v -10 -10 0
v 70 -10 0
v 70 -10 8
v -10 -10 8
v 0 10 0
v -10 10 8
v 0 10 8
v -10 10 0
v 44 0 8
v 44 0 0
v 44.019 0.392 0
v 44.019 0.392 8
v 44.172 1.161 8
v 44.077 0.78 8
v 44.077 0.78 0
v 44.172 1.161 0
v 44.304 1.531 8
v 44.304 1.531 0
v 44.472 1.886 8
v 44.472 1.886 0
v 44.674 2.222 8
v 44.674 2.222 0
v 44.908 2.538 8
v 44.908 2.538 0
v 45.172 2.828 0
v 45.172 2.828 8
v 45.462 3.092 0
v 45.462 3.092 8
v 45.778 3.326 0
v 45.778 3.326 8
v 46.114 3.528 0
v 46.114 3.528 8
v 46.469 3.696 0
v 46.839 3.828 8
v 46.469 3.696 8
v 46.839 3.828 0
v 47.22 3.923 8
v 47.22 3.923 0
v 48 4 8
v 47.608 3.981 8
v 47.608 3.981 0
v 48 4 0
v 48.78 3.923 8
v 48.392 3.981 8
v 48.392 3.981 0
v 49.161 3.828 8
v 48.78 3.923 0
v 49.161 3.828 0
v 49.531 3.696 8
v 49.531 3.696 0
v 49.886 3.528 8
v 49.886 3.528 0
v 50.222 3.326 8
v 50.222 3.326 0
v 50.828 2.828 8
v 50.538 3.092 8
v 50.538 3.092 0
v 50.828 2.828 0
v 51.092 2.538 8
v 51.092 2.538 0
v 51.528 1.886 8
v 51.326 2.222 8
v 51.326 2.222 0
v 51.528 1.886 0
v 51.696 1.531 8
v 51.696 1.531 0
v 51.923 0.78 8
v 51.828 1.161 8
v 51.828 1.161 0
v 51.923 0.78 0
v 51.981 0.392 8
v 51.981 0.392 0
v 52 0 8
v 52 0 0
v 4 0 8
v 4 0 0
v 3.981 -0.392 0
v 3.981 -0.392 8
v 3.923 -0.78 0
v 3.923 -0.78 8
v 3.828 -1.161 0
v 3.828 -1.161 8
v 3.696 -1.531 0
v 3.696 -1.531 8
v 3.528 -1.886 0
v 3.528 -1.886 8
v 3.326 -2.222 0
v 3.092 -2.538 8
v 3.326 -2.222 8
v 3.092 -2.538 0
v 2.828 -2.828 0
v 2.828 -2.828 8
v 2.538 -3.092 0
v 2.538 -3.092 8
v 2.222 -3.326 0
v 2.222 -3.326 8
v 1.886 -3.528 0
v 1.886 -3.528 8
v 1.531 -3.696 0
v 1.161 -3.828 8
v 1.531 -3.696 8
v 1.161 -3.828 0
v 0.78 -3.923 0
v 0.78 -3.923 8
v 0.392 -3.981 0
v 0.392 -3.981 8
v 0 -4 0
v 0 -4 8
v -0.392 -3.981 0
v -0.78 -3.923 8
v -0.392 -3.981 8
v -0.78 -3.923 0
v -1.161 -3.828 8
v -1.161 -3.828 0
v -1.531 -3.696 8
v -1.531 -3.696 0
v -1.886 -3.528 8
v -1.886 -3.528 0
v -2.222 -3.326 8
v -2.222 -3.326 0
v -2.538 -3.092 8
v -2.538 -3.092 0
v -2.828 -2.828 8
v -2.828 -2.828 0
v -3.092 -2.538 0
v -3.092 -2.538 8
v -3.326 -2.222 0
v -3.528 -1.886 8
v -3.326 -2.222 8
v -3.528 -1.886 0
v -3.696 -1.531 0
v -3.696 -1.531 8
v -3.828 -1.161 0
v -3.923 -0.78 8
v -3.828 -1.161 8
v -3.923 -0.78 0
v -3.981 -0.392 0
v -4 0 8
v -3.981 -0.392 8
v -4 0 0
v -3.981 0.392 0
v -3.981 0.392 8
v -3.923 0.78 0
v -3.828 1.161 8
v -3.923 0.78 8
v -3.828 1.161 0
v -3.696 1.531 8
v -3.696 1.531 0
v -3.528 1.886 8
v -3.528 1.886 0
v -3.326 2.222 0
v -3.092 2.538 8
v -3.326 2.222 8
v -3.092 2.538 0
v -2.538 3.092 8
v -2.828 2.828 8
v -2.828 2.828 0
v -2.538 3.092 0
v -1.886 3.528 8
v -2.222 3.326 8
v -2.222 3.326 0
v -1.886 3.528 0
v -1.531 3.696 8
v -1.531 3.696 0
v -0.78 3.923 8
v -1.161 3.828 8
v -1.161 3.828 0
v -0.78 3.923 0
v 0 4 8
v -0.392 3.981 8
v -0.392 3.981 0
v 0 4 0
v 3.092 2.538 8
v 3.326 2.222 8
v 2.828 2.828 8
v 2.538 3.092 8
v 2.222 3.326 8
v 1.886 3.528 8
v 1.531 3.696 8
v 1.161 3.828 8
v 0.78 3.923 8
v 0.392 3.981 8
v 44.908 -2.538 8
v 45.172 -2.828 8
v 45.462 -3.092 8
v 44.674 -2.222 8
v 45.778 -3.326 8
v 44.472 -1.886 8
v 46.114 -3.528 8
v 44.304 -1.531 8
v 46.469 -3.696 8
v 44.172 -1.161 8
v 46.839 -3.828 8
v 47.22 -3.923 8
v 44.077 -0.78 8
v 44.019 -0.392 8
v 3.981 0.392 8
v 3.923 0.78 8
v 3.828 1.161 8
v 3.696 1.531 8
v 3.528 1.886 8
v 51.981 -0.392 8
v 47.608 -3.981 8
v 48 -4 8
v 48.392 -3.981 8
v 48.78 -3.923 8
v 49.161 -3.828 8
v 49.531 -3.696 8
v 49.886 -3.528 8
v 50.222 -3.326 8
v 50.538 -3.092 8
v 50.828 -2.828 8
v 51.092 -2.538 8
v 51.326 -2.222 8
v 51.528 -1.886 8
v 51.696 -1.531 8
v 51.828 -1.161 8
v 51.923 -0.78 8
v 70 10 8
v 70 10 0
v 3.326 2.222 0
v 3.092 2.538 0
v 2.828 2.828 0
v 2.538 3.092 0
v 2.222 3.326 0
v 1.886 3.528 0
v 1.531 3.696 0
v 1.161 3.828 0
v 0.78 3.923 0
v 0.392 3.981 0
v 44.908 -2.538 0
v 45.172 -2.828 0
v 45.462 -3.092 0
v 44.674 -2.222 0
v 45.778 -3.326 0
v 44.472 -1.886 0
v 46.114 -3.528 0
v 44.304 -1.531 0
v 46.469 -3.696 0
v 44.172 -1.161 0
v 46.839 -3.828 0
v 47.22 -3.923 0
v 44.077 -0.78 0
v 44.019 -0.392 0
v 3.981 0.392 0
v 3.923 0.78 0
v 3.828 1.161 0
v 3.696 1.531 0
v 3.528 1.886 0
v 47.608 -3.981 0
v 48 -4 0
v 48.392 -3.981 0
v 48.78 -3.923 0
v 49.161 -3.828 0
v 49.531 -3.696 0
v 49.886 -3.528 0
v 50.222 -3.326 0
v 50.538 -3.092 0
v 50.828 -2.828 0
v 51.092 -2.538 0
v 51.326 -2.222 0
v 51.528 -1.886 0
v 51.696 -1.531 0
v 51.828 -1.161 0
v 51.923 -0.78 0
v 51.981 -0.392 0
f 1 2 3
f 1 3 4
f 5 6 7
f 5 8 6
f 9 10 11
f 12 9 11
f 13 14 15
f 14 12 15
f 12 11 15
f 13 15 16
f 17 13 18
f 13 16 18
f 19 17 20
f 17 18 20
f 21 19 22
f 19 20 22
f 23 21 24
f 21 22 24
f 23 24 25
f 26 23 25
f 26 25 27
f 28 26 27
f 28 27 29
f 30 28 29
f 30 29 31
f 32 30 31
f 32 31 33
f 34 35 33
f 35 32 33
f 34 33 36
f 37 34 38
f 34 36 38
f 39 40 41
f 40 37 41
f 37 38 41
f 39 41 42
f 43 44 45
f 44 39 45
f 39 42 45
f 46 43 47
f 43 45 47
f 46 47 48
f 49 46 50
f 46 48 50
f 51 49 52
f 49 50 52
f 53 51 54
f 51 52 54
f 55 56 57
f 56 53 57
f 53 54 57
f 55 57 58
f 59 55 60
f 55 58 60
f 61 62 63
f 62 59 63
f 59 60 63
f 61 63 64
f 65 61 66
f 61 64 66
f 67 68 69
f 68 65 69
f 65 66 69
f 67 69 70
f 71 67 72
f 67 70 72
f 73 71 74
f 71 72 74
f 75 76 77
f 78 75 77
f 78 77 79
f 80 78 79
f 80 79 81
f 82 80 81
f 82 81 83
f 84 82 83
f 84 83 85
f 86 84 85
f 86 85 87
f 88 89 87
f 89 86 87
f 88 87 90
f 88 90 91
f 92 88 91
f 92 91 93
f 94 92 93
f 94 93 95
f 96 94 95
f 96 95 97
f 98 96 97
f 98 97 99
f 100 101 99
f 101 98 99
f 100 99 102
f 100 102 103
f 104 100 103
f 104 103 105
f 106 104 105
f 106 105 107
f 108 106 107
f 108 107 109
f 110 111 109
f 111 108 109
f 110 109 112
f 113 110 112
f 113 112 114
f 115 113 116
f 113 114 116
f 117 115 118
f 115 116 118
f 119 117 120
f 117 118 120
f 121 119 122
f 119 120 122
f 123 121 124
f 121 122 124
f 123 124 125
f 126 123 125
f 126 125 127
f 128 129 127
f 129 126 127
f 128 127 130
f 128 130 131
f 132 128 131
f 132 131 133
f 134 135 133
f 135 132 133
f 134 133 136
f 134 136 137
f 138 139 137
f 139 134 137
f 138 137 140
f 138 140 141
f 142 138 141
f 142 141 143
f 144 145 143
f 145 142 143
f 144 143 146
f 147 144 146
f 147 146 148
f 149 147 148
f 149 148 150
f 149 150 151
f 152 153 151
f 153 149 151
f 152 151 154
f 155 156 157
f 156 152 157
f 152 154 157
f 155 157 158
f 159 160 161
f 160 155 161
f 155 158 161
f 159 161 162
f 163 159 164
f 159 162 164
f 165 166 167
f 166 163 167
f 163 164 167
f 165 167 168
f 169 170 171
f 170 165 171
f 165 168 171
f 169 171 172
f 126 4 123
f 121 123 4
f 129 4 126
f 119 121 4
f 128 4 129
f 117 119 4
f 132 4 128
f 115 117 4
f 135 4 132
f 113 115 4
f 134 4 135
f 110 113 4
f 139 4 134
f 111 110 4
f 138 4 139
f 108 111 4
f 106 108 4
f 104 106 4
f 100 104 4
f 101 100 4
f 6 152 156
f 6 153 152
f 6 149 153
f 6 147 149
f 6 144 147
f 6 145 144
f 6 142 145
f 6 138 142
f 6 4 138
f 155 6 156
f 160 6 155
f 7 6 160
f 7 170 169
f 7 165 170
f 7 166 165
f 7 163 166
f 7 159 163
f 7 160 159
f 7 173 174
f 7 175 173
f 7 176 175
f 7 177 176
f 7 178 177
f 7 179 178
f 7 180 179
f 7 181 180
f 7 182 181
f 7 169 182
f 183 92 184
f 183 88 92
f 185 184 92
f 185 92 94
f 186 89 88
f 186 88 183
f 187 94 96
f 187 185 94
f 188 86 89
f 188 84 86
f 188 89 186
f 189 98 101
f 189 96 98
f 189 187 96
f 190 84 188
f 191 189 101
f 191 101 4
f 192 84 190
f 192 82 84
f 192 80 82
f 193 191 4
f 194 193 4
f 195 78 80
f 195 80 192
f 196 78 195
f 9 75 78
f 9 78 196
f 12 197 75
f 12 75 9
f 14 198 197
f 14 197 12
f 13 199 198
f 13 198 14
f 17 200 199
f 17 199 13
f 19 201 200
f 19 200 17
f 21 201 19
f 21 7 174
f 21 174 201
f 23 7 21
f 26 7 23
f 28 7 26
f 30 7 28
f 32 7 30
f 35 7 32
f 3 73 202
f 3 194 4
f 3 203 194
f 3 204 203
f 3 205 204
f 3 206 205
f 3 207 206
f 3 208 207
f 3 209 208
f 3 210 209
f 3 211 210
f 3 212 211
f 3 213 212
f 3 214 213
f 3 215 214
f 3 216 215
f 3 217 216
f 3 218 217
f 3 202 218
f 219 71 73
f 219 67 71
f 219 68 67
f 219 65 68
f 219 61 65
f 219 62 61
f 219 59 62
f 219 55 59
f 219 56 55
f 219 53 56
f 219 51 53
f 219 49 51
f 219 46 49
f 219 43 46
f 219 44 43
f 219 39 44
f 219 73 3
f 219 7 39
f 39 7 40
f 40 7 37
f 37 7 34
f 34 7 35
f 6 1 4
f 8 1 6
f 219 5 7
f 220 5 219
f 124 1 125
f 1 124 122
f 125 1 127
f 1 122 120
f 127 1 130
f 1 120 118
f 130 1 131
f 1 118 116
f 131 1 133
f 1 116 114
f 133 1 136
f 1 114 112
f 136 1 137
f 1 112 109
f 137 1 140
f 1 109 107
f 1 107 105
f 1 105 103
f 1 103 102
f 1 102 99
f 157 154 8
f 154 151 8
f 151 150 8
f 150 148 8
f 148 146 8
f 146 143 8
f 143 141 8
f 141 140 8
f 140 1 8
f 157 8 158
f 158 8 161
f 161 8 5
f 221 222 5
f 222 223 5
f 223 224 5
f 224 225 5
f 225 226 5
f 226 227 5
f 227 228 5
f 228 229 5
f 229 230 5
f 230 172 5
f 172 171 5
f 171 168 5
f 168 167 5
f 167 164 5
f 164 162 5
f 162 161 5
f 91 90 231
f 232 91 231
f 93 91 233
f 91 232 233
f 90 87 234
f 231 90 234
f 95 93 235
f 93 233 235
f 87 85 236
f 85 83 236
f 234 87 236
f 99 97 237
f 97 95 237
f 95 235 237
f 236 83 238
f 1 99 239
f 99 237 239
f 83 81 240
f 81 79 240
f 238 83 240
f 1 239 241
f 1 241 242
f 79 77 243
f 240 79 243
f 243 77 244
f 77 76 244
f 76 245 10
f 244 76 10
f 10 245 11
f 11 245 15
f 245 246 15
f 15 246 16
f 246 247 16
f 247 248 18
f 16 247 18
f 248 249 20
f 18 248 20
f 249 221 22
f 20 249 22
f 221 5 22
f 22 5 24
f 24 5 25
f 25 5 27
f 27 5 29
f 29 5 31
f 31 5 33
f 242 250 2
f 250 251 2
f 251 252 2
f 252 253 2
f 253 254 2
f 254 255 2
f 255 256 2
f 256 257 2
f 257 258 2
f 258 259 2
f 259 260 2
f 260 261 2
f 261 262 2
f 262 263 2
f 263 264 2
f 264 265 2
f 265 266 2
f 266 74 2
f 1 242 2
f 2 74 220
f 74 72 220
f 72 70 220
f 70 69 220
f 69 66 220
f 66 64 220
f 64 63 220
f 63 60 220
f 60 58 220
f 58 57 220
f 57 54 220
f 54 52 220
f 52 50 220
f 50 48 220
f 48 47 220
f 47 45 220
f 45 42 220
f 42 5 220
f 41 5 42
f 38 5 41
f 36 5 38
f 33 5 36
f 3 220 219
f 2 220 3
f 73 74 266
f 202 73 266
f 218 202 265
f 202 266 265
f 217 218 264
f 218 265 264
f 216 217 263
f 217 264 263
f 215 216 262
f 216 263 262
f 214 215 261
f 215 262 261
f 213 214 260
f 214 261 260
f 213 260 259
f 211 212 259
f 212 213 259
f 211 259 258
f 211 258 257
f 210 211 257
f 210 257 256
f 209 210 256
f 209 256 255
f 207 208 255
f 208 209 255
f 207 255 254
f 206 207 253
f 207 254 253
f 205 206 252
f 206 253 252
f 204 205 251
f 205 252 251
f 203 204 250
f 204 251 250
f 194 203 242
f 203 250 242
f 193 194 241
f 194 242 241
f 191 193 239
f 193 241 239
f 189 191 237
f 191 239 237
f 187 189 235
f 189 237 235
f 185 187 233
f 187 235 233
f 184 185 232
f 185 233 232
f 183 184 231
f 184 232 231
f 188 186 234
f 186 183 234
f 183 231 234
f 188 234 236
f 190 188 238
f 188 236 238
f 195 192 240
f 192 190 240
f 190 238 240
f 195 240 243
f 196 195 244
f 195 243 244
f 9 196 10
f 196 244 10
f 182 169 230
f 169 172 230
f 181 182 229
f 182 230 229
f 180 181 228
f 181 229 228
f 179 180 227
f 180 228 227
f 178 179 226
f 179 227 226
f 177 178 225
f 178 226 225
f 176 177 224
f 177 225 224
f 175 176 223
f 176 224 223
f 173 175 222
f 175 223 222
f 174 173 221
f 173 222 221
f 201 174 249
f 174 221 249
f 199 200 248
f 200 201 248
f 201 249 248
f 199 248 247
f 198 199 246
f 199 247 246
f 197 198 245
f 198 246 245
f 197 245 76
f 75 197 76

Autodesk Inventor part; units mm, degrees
ref_plane "YZ Plane" through (0, 0, 0) normal (1, 0, 0) x (0, 1, 0)
ref_plane "XZ Plane" through (0, 0, 0) normal (0, 1, 0) x (-1, 0, 0)
ref_plane "XY Plane" through (0, 0, 0) normal (0, 0, 1) x (1, 0, 0)
sketch "Sketch1" plane through (0, 0, 0) normal (0, 0, 1) x (1, 0, 0)
  circle A0 centre (0, 0) radius 4
  line L0 (0, 0) -> (48, 0)
  circle A1 centre (48, 0) radius 4
  line L1 (0, 0) -> (0, 10)
  line L2 (0, 10) -> (70, 10)
  line L3 (70, 10) -> (70, -10)
  line L4 (70, -10) -> (-10, -10)
  line L5 (-10, -10) -> (-10, 10)
  line L6 (-10, 10) -> (0, 10)
  dimension "d0" = 8
  dimension "d1" = 48
  dimension "d2" = 8
  dimension "d3" = 10
  dimension "d4" = 70
  dimension "d5" = 20
  dimension "d6" = 80
extrude "Extrusion1" add sketch "Sketch1" along normal blind 8
properties part number "plaque 1"
